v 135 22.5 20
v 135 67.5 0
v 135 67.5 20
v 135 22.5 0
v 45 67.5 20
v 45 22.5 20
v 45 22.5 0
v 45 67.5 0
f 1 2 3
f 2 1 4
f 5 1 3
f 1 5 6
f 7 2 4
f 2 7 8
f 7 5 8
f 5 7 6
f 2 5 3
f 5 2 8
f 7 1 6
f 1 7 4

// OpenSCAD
// Drying rack for microscope slides - a solid base block with a row of parallel slots open at the
// top, so slides standing on their long edge are half immersed in water and dry upright. NOVEL
// general part (a generic "slide rack" rather than any one lab's part).
//

slides   = 10;
slide_w  = 75;
slide_h  = 25;
slide_t  = 1;
base_l   = 90;
base_w   = 45;
base_h   = 20;
slot_l   = 77;
slot_w   = 1.6;
slot_d   = 10;
pitch    = 3.5;

$fn = 48;

slot_y = slide_w + pitch;                 // centre-to-centre in Y
total_y = slot_y * slides + pitch;       // bounding box in Y if the slots were a solid comb
margin_y = (base_w - total_y) / 2;
start_y = base_w / 2 - total_y / 2 + margin_y;

difference() {
    translate([base_l / 2, base_w / 2, 0]) cube([base_l, base_w, base_h]);
    for (i = [0 : slides - 1])
        translate([base_l / 2, start_y + i * slot_y, -1])
            cube([slot_l, slot_w, base_h - slot_d]);
}
